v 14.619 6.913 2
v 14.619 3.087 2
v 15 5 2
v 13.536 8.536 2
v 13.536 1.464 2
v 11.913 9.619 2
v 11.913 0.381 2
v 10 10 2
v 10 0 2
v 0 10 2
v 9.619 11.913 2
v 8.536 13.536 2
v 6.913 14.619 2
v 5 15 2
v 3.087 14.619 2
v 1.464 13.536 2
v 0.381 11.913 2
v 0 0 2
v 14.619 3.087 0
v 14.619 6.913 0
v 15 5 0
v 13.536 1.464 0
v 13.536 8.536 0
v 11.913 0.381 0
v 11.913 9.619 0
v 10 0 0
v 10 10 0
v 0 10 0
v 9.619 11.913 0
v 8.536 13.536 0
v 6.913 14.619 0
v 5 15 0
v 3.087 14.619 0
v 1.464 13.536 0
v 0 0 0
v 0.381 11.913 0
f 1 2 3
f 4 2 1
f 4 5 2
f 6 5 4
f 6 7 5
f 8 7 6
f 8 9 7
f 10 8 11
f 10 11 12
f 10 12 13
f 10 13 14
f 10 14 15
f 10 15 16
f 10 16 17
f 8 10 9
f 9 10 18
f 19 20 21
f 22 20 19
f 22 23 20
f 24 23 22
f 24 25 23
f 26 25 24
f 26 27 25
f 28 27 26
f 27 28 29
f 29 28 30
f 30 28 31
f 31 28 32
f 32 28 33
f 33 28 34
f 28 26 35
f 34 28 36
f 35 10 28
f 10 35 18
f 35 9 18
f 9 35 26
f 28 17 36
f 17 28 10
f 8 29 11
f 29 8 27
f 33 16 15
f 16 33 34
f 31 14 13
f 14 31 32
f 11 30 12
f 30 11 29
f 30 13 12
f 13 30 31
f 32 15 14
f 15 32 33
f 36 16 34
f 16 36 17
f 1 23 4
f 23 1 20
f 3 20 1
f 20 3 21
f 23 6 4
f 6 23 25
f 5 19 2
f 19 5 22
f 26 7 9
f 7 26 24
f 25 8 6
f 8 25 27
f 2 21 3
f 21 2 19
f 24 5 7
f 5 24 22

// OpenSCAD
module heart(h, s) {
    cube([s, s, h]);
    translate([s/2, s, 0]) cylinder(r=s/2, h=h);
    translate([s, s/2, 0]) cylinder(r=s/2, h=h);
}

heart(2, 10);
